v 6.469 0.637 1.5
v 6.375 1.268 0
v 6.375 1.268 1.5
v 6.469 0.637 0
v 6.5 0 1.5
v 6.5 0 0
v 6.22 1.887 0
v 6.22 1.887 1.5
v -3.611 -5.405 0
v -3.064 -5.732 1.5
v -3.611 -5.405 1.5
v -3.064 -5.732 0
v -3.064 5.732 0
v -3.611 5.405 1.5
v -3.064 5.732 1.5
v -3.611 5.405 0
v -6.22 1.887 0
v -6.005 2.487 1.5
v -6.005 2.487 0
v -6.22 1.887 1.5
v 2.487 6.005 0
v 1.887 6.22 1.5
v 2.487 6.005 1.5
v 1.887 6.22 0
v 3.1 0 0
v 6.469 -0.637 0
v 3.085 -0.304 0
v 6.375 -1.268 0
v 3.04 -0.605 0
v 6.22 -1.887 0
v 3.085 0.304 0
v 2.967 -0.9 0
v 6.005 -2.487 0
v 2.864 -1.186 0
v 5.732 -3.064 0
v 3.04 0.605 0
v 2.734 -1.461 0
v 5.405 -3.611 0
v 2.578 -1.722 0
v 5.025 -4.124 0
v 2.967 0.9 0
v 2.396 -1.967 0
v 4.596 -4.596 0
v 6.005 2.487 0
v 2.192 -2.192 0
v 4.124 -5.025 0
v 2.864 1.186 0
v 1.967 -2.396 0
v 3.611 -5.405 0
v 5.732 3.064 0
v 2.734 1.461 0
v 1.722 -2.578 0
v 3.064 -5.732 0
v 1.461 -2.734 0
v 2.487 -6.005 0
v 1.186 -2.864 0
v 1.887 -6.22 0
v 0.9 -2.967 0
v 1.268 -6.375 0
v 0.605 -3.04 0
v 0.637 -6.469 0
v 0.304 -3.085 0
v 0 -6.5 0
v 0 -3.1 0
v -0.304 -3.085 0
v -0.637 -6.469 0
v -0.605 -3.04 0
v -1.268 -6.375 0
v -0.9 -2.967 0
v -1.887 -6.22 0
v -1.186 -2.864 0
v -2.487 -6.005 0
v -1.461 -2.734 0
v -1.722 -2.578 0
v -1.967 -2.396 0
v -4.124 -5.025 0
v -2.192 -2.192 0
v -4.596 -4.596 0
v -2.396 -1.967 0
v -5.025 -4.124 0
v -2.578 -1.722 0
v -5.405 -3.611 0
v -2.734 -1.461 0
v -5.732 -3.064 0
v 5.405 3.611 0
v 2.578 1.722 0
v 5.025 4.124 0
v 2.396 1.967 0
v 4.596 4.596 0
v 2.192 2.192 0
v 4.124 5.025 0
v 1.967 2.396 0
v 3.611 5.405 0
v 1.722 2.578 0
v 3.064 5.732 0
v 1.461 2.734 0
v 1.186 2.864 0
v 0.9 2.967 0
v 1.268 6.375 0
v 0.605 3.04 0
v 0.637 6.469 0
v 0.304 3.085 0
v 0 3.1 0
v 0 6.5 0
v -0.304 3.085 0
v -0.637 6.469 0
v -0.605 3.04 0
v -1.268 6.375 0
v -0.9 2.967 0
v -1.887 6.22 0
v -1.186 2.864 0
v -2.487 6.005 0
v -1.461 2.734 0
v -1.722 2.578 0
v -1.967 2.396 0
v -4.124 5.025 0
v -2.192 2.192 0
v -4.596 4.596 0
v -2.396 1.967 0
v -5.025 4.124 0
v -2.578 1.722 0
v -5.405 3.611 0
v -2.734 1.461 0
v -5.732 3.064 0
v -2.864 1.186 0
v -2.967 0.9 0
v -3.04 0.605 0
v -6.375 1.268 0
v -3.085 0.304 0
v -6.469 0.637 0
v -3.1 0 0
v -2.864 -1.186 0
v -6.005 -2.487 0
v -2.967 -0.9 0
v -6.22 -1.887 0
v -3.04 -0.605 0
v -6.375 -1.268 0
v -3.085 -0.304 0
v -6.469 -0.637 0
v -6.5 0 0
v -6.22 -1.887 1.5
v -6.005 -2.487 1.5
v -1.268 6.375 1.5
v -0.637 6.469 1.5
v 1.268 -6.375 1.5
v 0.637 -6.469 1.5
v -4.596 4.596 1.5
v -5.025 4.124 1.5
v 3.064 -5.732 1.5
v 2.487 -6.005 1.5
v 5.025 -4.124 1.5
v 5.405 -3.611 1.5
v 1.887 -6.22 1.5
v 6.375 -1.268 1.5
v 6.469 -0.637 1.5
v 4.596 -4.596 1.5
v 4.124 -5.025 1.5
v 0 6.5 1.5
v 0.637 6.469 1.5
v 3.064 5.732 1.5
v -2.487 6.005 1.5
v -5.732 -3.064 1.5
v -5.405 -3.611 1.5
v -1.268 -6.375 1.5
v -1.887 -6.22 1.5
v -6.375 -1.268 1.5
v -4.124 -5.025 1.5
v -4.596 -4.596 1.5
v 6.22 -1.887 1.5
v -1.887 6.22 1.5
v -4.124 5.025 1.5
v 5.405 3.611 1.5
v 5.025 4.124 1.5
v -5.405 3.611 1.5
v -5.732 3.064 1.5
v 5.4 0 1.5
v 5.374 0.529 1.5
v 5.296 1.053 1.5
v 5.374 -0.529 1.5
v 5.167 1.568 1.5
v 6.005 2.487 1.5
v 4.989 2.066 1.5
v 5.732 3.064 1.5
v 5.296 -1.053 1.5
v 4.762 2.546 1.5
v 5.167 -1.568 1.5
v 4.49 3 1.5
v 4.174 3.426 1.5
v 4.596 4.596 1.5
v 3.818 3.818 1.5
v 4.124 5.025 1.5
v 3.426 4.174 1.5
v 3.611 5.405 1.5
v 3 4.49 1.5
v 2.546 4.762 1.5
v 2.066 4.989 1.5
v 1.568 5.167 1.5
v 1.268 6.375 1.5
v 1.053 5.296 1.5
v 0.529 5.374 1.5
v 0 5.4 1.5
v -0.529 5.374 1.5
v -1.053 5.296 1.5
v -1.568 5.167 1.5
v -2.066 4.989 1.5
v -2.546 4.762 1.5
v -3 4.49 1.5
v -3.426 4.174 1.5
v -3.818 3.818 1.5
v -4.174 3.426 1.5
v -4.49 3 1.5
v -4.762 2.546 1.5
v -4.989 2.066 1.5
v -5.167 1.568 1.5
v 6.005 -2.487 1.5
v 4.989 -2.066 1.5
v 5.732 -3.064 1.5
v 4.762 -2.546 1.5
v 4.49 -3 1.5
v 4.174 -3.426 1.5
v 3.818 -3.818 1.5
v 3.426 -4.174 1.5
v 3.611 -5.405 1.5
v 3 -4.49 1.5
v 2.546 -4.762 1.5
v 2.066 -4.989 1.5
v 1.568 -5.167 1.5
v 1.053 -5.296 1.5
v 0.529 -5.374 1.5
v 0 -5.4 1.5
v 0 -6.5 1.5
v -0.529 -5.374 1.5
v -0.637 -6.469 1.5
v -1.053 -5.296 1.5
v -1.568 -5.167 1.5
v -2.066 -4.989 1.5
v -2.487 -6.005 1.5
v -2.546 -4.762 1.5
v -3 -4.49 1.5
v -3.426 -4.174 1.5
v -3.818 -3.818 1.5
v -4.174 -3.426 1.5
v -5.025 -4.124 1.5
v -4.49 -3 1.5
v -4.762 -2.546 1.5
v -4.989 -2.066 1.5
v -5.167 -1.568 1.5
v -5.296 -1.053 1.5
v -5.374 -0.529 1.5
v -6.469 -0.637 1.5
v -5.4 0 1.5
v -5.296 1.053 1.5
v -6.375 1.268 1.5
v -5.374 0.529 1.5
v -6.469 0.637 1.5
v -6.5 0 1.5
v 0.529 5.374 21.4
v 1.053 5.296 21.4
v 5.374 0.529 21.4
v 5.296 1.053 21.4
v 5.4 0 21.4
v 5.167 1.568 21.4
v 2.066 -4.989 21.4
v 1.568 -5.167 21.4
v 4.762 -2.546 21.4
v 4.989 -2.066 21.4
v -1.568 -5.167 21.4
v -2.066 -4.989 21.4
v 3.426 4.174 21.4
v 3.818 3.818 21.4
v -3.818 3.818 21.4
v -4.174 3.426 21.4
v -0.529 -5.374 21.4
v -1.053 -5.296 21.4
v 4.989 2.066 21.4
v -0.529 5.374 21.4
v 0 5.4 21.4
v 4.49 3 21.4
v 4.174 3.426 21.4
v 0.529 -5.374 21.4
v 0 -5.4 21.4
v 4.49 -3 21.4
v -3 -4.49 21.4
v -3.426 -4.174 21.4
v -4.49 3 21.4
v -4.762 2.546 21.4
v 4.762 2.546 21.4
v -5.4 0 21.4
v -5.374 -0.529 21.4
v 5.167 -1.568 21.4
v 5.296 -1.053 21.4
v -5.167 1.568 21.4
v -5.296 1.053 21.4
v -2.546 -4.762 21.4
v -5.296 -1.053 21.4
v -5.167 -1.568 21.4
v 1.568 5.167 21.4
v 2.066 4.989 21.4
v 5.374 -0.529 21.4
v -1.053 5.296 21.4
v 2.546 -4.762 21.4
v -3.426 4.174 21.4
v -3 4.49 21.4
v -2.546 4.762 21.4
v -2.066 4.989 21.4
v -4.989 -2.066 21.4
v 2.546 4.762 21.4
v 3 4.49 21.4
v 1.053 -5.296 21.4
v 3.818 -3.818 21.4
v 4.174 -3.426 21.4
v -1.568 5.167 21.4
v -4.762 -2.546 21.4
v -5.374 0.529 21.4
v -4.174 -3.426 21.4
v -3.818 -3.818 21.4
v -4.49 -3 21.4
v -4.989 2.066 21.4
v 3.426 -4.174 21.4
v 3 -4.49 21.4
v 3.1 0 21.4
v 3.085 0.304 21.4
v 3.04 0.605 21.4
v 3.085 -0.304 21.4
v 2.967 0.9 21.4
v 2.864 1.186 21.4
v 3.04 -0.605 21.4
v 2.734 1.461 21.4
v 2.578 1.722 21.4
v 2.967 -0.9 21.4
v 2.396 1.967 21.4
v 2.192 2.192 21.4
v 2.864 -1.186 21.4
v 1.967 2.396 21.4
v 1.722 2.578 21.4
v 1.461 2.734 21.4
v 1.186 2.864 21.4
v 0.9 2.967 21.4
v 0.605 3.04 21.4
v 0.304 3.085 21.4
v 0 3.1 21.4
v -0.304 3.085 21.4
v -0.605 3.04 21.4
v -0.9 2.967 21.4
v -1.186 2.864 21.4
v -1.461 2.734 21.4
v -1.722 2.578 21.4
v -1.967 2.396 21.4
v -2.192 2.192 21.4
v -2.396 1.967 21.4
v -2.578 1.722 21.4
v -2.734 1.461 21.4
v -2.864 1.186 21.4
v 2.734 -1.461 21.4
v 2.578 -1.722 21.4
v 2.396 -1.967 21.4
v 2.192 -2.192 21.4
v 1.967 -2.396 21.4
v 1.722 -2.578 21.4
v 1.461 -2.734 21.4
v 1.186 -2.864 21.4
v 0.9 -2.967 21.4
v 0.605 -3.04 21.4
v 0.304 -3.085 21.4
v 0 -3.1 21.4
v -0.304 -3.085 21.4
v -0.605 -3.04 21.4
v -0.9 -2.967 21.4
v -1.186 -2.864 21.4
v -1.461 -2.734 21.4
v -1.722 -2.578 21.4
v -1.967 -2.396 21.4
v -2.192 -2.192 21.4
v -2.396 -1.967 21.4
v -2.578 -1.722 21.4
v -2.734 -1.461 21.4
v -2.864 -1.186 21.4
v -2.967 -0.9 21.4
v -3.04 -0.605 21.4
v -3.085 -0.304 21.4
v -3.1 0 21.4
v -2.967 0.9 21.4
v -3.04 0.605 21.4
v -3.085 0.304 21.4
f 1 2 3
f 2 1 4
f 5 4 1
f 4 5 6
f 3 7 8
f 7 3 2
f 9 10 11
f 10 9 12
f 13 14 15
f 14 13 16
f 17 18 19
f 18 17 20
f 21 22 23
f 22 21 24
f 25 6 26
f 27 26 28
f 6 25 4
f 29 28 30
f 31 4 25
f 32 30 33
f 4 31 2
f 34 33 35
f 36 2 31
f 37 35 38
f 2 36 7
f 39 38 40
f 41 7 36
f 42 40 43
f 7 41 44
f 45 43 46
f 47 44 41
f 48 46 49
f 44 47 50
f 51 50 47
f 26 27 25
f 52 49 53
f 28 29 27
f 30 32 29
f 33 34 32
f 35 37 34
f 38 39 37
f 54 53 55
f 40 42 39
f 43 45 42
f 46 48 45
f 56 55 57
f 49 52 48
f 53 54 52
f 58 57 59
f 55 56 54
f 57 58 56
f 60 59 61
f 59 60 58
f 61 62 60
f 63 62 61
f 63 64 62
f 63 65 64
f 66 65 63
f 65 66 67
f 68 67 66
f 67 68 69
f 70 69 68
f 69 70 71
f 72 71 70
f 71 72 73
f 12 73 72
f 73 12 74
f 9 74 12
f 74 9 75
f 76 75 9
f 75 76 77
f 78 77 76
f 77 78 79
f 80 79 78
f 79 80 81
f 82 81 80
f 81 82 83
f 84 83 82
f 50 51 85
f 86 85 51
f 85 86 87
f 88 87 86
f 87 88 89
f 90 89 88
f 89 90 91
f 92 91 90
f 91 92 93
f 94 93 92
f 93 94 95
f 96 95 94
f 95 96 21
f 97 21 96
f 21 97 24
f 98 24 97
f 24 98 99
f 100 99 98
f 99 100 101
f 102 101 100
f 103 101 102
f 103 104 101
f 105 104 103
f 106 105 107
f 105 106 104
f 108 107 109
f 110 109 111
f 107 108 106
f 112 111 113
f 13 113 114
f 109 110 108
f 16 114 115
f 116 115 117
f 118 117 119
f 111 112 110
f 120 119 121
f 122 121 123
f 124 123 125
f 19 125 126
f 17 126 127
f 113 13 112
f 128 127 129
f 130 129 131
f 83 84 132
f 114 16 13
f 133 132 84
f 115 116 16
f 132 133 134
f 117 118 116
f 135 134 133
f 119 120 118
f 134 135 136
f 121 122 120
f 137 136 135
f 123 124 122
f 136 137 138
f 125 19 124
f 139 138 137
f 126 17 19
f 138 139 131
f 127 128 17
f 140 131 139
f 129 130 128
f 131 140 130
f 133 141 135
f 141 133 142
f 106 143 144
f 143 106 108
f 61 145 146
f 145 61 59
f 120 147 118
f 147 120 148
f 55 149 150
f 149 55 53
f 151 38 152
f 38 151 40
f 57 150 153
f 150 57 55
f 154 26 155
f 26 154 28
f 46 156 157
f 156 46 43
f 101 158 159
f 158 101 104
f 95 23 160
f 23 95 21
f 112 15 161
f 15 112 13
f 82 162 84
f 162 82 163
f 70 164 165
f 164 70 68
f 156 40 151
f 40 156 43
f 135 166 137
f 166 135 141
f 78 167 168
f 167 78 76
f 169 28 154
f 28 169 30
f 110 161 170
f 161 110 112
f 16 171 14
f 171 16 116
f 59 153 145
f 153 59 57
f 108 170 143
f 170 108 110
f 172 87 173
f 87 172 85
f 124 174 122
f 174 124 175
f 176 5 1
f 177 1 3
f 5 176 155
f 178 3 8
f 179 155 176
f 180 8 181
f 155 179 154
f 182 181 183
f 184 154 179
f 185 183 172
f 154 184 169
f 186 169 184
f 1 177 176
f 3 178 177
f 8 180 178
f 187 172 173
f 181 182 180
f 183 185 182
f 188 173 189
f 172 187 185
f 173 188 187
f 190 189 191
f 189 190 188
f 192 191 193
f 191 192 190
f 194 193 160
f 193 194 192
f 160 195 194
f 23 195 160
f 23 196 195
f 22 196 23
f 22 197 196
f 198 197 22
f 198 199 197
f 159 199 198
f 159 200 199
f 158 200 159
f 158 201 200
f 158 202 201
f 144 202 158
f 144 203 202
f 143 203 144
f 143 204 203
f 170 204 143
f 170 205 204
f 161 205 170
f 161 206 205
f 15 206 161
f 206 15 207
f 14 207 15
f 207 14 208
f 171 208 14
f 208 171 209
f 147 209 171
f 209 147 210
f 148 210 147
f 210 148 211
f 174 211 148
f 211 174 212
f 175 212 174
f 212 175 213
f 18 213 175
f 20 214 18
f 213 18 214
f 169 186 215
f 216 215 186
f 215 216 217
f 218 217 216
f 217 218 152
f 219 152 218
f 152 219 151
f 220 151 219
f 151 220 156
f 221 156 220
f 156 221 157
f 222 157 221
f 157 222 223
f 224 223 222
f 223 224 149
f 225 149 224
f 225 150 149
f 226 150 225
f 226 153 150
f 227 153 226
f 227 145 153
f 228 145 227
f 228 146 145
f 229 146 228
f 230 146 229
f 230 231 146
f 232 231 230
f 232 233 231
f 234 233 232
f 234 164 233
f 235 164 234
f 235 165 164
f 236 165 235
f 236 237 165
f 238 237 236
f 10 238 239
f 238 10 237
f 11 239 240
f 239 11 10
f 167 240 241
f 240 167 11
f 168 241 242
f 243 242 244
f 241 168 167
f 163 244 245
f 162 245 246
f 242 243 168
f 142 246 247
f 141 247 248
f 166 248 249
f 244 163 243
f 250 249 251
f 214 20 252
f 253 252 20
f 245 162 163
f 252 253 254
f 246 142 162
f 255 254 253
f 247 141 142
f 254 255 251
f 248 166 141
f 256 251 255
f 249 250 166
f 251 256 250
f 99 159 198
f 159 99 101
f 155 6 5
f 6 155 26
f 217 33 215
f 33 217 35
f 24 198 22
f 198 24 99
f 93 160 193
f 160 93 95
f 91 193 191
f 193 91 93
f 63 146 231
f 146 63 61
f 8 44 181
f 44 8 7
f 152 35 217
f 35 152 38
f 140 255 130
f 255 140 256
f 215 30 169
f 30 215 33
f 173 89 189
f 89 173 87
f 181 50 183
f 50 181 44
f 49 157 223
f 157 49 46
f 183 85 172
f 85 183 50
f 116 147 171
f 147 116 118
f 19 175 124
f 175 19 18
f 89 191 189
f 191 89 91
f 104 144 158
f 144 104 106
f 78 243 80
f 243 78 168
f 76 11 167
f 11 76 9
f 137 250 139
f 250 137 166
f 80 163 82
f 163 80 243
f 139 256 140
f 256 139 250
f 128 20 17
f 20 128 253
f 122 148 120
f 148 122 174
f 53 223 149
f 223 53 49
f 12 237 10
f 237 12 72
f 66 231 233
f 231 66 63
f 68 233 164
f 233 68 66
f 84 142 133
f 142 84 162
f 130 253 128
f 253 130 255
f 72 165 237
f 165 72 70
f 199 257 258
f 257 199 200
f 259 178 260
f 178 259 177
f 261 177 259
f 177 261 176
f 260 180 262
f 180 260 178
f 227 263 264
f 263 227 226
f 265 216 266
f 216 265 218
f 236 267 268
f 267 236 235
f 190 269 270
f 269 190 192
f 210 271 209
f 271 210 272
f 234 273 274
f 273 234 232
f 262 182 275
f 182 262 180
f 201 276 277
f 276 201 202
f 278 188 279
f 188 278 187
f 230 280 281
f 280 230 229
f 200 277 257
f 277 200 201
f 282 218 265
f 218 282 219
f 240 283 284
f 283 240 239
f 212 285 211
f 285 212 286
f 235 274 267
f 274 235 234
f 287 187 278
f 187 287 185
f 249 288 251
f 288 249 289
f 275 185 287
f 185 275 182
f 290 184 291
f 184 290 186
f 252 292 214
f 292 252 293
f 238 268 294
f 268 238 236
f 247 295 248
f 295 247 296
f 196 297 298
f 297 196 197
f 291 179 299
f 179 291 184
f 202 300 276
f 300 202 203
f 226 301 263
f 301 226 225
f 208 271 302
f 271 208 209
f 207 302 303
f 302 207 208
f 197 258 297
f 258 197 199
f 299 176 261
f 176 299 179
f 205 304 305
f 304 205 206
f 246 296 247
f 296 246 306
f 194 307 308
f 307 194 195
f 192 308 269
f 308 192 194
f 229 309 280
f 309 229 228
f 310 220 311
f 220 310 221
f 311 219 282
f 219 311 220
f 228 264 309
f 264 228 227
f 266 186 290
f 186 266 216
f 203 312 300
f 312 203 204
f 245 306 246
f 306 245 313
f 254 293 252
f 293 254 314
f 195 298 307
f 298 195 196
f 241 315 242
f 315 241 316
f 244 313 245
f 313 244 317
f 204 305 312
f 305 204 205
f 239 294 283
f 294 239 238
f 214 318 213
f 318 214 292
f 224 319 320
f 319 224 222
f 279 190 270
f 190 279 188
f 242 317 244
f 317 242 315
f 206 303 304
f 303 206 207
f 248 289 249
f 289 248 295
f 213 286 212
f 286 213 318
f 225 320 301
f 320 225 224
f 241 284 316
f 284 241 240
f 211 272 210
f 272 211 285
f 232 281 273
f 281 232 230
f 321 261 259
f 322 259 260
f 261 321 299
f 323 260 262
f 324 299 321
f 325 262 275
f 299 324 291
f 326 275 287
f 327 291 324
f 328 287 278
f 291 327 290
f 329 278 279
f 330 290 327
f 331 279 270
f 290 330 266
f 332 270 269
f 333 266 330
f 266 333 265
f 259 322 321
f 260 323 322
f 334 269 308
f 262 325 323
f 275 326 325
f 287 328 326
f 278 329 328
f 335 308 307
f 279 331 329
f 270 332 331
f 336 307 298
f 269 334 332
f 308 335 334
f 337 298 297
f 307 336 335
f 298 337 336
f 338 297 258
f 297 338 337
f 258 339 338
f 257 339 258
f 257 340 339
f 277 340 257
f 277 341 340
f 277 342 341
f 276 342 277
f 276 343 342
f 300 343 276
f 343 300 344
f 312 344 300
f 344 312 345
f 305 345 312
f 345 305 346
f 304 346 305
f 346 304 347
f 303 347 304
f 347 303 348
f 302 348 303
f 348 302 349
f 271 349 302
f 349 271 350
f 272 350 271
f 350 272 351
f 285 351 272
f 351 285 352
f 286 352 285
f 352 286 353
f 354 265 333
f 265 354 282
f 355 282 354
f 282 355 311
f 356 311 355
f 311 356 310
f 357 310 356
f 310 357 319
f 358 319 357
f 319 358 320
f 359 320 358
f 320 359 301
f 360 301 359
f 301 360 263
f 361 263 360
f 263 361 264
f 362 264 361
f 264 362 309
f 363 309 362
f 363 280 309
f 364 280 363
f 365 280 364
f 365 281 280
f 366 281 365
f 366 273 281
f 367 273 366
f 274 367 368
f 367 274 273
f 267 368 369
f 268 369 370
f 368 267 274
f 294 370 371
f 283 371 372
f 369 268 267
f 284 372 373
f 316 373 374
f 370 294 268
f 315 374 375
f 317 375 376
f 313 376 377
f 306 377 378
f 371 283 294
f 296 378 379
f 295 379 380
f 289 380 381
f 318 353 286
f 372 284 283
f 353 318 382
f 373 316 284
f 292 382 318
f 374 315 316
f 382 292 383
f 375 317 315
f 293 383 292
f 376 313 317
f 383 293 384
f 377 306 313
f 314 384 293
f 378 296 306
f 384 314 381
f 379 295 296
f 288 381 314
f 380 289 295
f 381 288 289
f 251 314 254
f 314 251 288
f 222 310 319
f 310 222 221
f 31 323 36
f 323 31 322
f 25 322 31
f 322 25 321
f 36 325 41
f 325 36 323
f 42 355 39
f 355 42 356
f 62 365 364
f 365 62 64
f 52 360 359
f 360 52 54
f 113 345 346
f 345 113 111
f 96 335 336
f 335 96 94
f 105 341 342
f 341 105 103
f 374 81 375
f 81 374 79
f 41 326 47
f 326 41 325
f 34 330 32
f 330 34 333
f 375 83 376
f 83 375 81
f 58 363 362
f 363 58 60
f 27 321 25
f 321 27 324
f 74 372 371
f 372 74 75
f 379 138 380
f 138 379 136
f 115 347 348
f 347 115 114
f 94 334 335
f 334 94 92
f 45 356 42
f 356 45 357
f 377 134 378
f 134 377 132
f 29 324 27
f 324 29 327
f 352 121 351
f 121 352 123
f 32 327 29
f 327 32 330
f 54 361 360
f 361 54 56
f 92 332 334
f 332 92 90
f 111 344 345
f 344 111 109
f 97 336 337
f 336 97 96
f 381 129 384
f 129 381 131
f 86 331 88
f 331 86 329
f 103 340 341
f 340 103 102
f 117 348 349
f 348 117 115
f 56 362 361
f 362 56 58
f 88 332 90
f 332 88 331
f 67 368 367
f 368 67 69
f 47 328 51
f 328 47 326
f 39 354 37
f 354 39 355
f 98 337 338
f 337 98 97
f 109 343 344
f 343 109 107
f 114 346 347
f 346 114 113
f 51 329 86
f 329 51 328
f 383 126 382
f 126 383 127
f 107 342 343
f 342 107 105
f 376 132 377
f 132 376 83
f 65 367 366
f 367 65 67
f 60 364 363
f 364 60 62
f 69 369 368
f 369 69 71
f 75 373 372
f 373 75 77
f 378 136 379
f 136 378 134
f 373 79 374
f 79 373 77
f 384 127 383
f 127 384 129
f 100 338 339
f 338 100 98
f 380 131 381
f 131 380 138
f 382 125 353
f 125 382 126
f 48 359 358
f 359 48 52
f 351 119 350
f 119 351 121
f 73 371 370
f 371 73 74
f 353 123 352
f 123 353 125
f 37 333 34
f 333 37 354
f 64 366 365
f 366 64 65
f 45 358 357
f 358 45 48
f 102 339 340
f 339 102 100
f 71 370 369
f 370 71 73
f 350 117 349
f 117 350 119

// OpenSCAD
// Adapter sleeve: 0.2 mL PCR tube in a 1.5 mL rack hole
// Print orientation: collar on the bed, sleeve body pointing up (+Z)

$fn = 64;

// ---- Dimensions (mm) ----
collar_d        = 13;     // collar outer diameter
collar_h        = 1.5;    // collar thickness (z = 0 to 1.5)
sleeve_od       = 10.8;   // sleeve body outer diameter
sleeve_h        = 19.9;   // sleeve body height above collar (z = 1.5 to 21.4)
bore_d          = 6.2;    // straight through-bore diameter
eps             = 0.5;    // cutter overshoot past faces

total_h = collar_h + sleeve_h;  // overall height (21.4 mm)

difference() {
    union() {
        // Collar
        cylinder(d = collar_d, h = collar_h);
        // Sleeve body (slightly overlapping the collar for a clean union)
        translate([0, 0, collar_h - 0.01])
            cylinder(d = sleeve_od, h = sleeve_h + 0.01);
    }
    // Full-height bore, open at both ends
    translate([0, 0, -eps])
        cylinder(d = bore_d, h = total_h + 2 * eps);
}
